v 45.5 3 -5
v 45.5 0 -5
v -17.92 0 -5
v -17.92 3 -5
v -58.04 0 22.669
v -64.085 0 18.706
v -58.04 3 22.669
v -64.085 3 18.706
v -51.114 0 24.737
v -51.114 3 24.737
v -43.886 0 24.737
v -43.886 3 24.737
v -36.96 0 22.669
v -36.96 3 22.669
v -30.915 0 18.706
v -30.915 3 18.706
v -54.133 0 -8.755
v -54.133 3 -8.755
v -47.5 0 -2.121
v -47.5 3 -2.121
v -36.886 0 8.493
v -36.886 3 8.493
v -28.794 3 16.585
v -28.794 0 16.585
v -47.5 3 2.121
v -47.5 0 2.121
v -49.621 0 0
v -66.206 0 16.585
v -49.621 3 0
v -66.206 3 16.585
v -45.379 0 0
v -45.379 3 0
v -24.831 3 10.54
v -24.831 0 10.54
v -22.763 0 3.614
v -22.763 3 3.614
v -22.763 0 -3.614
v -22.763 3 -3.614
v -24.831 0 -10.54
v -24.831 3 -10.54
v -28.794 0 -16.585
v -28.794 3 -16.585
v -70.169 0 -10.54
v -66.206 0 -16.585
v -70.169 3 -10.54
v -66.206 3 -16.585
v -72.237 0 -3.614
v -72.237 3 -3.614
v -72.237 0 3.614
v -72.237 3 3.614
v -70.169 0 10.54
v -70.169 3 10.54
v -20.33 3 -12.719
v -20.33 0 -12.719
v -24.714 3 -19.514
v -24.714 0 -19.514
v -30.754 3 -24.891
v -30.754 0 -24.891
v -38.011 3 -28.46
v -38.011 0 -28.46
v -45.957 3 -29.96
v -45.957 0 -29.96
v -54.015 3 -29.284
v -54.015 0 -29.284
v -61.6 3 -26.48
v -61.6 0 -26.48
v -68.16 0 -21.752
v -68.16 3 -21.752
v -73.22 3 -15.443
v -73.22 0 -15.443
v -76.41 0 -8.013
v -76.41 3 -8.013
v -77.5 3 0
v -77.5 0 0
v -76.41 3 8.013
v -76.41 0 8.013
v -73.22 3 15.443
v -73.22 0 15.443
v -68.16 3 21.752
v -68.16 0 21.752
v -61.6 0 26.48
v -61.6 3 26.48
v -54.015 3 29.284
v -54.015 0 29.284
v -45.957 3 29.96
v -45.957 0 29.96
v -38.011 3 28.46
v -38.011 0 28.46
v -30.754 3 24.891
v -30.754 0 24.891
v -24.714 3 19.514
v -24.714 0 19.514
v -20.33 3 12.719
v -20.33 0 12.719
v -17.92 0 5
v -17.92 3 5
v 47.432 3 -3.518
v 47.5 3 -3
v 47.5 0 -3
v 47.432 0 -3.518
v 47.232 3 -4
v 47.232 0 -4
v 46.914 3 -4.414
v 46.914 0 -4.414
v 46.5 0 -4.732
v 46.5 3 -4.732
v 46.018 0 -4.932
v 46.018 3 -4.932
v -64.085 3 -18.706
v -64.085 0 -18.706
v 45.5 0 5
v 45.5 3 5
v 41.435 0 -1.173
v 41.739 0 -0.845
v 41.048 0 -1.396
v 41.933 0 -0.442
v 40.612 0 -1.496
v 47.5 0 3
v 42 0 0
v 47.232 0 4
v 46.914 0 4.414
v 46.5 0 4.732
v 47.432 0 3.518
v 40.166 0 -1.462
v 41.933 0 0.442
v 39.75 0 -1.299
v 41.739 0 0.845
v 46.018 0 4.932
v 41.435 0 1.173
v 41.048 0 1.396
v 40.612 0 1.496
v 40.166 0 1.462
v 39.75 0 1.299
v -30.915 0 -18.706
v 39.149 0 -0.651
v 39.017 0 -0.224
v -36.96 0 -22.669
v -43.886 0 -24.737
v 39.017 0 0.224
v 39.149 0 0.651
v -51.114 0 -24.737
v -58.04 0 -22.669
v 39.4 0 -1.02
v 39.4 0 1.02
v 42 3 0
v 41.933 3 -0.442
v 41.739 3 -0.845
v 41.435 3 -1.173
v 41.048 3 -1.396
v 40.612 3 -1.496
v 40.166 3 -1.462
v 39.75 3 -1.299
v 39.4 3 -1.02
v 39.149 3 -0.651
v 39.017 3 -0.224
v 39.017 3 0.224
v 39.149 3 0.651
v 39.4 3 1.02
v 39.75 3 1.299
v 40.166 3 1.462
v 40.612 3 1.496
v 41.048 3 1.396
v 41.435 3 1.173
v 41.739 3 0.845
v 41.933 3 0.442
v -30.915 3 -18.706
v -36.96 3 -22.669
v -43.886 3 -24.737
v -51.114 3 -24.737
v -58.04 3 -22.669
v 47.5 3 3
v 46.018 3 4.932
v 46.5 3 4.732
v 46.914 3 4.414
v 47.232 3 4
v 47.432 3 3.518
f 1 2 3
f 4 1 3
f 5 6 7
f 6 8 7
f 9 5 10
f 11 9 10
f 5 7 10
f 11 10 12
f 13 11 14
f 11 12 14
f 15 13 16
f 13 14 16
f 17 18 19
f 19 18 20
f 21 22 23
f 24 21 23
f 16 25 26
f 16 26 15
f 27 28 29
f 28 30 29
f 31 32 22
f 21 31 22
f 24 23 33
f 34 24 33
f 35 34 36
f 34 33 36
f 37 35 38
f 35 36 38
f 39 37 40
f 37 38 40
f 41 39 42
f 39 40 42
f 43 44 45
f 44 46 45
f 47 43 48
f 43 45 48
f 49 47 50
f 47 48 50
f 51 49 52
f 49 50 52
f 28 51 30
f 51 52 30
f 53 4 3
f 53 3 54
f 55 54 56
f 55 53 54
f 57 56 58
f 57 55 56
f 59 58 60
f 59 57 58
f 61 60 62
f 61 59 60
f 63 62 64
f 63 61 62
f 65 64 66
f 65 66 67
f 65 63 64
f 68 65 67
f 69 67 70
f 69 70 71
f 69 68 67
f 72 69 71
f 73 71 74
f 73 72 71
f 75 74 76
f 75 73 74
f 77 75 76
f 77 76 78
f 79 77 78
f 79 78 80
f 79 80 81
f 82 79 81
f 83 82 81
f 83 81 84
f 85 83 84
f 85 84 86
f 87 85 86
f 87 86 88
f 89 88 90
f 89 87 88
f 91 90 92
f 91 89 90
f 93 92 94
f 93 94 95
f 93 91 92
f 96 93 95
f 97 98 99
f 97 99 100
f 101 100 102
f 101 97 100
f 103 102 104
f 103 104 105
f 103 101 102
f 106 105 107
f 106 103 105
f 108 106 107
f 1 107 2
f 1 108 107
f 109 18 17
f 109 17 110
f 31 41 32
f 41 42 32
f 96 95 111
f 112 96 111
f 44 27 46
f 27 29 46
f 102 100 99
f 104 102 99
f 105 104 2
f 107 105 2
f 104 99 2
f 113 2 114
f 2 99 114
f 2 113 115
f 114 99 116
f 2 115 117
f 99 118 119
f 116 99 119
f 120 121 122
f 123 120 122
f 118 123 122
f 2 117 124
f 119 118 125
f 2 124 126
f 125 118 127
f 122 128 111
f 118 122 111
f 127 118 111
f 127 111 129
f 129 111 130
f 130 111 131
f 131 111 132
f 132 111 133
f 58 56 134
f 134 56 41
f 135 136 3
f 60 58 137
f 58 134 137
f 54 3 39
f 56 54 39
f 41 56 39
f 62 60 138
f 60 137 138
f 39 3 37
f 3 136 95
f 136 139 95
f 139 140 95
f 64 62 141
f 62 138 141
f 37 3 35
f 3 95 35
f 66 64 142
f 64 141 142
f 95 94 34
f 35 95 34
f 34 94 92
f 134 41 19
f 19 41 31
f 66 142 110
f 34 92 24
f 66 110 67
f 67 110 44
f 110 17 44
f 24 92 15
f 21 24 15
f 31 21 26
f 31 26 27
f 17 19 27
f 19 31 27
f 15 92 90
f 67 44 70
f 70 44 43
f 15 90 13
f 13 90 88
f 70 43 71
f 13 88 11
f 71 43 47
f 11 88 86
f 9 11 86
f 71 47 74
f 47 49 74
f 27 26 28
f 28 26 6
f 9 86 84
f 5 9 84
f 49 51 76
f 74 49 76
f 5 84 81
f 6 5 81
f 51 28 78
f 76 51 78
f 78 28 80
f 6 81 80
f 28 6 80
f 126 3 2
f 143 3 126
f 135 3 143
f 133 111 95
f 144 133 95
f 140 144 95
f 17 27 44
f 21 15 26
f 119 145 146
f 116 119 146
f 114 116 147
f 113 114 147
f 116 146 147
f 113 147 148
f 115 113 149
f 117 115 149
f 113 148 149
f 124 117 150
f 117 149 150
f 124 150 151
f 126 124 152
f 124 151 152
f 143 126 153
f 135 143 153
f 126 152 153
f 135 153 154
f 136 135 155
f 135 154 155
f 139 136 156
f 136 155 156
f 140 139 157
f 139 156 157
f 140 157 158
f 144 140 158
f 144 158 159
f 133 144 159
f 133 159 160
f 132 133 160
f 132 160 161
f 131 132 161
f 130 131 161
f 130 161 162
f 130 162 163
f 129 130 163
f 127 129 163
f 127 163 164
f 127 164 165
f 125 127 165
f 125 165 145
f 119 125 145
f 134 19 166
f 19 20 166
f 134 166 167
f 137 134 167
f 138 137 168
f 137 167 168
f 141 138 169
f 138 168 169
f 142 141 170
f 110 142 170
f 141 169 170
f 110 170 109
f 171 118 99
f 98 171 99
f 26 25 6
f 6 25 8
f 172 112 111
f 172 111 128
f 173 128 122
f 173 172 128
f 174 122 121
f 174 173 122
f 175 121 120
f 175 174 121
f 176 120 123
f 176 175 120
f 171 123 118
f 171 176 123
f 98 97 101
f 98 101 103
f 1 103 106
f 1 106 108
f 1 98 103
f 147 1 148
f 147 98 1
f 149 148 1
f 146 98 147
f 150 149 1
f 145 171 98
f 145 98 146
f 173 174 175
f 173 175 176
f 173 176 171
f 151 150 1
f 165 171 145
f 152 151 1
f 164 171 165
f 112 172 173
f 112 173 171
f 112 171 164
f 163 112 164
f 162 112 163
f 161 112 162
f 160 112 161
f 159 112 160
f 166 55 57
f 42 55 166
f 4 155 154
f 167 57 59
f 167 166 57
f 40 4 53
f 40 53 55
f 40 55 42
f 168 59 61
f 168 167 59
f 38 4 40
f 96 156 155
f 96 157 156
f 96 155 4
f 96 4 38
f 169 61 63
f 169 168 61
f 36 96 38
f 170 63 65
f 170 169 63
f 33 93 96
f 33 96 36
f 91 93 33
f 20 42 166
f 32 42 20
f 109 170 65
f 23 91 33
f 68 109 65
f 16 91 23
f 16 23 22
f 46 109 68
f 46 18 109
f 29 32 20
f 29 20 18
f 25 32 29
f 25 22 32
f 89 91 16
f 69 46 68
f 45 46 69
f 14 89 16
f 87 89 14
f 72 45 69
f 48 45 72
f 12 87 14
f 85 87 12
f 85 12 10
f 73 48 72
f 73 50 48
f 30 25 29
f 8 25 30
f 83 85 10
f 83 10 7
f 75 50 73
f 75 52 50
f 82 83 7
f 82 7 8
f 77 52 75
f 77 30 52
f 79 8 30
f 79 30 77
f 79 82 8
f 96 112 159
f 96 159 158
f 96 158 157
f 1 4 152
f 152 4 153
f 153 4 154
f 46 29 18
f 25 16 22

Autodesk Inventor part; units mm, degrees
ref_plane "YZ Plane" through (0, 0, 0) normal (1, 0, 0) x (0, 1, 0)
ref_plane "XZ Plane" through (0, 0, 0) normal (0, 1, 0) x (-1, 0, 0)
ref_plane "XY Plane" through (0, 0, 0) normal (0, 0, 1) x (1, 0, 0)
sketch "Boceto1" plane through (0, 0, 0) normal (0, 1, 0) x (-1, 0, 0)
  line L0 (47.5, 5) -> (-47.5, 5)
  line L1 (-47.5, 5) -> (-47.5, -5)
  line L2 (-47.5, -5) -> (47.5, -5)
  line L3 (47.5, -5) -> (47.5, 5)
  line L4 (47.5, 5) -> (-47.5, -5) construction
  line L5 (-47.5, 5) -> (47.5, -5) construction
  point P0 (0, 0)
  dimension "d0" = 95
  dimension "d1" = 10
extrude "Extrusión1" add sketch "Boceto1" along normal blind 3
sketch "Boceto2" plane through (0, 3, 0) normal (0, 1, 0) x (1, 0, 0)
  circle A0 centre (40.5, 0) radius 1.5
  line L0 (47.5, 5) -> (-47.5, 5) projected
  line L1 (47.5, -5) -> (47.5, 5) projected
  point P0 (0, 0)
  point P1 (47.5, 0)
  point P2 (47.5, 0)
  dimension "d4" = 3
  dimension "d5" = 5
  dimension "d7" = 7
extrude "Extrusión2" cut sketch "Boceto2" against normal blind 3
fillet "Empalme1" radius 2 1 edges at (-47.5, 1.5, 5)
fillet "Empalme2" radius 2 1 edges at (-47.5, 1.5, -5)
fillet "Empalme3" radius 2 1 edges at (47.5, 1.5, 5)
fillet "Empalme4" radius 2 1 edges at (47.5, 1.5, -5)
sketch "Boceto3" plane through (0, 3, 0) normal (0, 1, 0) x (1, 0, 0)
  line L0 (-47.5, 3) -> (-47.5, -3) projected
  circle A0 centre (-47.5, 0) radius 30
  line L1 (-47.5, 0) -> (-17.5, 0) construction
  line L2 (-47.5, 0) -> (-17.5, 0) construction
  point P0 (0, 0)
  dimension "d14" = 60
extrude "Extrusión3" add sketch "Boceto3" against normal blind 3
sketch "Boceto4" plane through (0, 3, 0) normal (0, 1, 0) x (1, 0, 0)
  arc A0 (-17.9196, 5) -> (-17.9196, -5) centre (-47.5, 0) ccw projected
  line L0 (-68.7649, 21.0578) -> (-8.8386, 21.0578) construction
  line L1 (-47.5, 0) -> (-26.4422, 21.0578)
  line L2 (-47.5, 0) -> (-17.7197, 0) construction
  line L3 (-47.5, 0) -> (-17.7197, 0) construction
  line L4 (-47.5, 0) -> (-68.7132, -21.2132)
  line L5 (-69.7473, 20.126) -> (-9.853, 20.126) construction
  line L6 (-59.6555, 10.0342) -> (-39.9443, -9.677)
  line L7 (-54.1333, 8.7547) -> (-36.886, -8.4927)
  line L8 (-59.6555, 10.0342) -> (-69.7473, 20.126)
  line L9 (-54.1333, 8.7547) -> (-67.626, 22.2473)
  line L10 (-36.886, -8.4927) -> (-25.2527, -20.126)
  line L11 (-39.9443, -9.677) -> (-27.374, -22.2473)
  line L12 (-69.7473, -20.126) -> (-27.374, 22.2473)
  line L13 (-25.2527, 20.126) -> (-67.626, -22.2473)
  circle A1 centre (-47.5, 0) radius 25
  point P0 (0, 0)
  point P1 (-64.0852, -18.7065)
  point P2 (-30.9148, -18.7065)
  point P3 (-47.5, -2.1213)
  point P4 (-28.7935, -16.5852)
  point P5 (-28.7935, 16.5852)
  point P6 (-45.3787, 0)
  point P7 (-30.9148, 18.7065)
  point P8 (-64.0852, 18.7065)
  point P9 (-47.5, 2.1213)
  point P10 (-66.2065, 16.5852)
  point P11 (-66.2065, -16.5852)
  point P12 (-49.6213, 0)
  dimension "d20" = 45
  dimension "d23" = 3
  dimension "d32" = 3
  dimension "d33" = 1.5
  dimension "d34" = 50
extrude "Extrusión4" cut sketch "Boceto4" against normal blind 3 contours A1 L10 L7 L13 | L12 L7 L9 A1 | L6 L11 A1 L13 | L8 L6 L12 A1
properties part number "Brazo_Servo"
